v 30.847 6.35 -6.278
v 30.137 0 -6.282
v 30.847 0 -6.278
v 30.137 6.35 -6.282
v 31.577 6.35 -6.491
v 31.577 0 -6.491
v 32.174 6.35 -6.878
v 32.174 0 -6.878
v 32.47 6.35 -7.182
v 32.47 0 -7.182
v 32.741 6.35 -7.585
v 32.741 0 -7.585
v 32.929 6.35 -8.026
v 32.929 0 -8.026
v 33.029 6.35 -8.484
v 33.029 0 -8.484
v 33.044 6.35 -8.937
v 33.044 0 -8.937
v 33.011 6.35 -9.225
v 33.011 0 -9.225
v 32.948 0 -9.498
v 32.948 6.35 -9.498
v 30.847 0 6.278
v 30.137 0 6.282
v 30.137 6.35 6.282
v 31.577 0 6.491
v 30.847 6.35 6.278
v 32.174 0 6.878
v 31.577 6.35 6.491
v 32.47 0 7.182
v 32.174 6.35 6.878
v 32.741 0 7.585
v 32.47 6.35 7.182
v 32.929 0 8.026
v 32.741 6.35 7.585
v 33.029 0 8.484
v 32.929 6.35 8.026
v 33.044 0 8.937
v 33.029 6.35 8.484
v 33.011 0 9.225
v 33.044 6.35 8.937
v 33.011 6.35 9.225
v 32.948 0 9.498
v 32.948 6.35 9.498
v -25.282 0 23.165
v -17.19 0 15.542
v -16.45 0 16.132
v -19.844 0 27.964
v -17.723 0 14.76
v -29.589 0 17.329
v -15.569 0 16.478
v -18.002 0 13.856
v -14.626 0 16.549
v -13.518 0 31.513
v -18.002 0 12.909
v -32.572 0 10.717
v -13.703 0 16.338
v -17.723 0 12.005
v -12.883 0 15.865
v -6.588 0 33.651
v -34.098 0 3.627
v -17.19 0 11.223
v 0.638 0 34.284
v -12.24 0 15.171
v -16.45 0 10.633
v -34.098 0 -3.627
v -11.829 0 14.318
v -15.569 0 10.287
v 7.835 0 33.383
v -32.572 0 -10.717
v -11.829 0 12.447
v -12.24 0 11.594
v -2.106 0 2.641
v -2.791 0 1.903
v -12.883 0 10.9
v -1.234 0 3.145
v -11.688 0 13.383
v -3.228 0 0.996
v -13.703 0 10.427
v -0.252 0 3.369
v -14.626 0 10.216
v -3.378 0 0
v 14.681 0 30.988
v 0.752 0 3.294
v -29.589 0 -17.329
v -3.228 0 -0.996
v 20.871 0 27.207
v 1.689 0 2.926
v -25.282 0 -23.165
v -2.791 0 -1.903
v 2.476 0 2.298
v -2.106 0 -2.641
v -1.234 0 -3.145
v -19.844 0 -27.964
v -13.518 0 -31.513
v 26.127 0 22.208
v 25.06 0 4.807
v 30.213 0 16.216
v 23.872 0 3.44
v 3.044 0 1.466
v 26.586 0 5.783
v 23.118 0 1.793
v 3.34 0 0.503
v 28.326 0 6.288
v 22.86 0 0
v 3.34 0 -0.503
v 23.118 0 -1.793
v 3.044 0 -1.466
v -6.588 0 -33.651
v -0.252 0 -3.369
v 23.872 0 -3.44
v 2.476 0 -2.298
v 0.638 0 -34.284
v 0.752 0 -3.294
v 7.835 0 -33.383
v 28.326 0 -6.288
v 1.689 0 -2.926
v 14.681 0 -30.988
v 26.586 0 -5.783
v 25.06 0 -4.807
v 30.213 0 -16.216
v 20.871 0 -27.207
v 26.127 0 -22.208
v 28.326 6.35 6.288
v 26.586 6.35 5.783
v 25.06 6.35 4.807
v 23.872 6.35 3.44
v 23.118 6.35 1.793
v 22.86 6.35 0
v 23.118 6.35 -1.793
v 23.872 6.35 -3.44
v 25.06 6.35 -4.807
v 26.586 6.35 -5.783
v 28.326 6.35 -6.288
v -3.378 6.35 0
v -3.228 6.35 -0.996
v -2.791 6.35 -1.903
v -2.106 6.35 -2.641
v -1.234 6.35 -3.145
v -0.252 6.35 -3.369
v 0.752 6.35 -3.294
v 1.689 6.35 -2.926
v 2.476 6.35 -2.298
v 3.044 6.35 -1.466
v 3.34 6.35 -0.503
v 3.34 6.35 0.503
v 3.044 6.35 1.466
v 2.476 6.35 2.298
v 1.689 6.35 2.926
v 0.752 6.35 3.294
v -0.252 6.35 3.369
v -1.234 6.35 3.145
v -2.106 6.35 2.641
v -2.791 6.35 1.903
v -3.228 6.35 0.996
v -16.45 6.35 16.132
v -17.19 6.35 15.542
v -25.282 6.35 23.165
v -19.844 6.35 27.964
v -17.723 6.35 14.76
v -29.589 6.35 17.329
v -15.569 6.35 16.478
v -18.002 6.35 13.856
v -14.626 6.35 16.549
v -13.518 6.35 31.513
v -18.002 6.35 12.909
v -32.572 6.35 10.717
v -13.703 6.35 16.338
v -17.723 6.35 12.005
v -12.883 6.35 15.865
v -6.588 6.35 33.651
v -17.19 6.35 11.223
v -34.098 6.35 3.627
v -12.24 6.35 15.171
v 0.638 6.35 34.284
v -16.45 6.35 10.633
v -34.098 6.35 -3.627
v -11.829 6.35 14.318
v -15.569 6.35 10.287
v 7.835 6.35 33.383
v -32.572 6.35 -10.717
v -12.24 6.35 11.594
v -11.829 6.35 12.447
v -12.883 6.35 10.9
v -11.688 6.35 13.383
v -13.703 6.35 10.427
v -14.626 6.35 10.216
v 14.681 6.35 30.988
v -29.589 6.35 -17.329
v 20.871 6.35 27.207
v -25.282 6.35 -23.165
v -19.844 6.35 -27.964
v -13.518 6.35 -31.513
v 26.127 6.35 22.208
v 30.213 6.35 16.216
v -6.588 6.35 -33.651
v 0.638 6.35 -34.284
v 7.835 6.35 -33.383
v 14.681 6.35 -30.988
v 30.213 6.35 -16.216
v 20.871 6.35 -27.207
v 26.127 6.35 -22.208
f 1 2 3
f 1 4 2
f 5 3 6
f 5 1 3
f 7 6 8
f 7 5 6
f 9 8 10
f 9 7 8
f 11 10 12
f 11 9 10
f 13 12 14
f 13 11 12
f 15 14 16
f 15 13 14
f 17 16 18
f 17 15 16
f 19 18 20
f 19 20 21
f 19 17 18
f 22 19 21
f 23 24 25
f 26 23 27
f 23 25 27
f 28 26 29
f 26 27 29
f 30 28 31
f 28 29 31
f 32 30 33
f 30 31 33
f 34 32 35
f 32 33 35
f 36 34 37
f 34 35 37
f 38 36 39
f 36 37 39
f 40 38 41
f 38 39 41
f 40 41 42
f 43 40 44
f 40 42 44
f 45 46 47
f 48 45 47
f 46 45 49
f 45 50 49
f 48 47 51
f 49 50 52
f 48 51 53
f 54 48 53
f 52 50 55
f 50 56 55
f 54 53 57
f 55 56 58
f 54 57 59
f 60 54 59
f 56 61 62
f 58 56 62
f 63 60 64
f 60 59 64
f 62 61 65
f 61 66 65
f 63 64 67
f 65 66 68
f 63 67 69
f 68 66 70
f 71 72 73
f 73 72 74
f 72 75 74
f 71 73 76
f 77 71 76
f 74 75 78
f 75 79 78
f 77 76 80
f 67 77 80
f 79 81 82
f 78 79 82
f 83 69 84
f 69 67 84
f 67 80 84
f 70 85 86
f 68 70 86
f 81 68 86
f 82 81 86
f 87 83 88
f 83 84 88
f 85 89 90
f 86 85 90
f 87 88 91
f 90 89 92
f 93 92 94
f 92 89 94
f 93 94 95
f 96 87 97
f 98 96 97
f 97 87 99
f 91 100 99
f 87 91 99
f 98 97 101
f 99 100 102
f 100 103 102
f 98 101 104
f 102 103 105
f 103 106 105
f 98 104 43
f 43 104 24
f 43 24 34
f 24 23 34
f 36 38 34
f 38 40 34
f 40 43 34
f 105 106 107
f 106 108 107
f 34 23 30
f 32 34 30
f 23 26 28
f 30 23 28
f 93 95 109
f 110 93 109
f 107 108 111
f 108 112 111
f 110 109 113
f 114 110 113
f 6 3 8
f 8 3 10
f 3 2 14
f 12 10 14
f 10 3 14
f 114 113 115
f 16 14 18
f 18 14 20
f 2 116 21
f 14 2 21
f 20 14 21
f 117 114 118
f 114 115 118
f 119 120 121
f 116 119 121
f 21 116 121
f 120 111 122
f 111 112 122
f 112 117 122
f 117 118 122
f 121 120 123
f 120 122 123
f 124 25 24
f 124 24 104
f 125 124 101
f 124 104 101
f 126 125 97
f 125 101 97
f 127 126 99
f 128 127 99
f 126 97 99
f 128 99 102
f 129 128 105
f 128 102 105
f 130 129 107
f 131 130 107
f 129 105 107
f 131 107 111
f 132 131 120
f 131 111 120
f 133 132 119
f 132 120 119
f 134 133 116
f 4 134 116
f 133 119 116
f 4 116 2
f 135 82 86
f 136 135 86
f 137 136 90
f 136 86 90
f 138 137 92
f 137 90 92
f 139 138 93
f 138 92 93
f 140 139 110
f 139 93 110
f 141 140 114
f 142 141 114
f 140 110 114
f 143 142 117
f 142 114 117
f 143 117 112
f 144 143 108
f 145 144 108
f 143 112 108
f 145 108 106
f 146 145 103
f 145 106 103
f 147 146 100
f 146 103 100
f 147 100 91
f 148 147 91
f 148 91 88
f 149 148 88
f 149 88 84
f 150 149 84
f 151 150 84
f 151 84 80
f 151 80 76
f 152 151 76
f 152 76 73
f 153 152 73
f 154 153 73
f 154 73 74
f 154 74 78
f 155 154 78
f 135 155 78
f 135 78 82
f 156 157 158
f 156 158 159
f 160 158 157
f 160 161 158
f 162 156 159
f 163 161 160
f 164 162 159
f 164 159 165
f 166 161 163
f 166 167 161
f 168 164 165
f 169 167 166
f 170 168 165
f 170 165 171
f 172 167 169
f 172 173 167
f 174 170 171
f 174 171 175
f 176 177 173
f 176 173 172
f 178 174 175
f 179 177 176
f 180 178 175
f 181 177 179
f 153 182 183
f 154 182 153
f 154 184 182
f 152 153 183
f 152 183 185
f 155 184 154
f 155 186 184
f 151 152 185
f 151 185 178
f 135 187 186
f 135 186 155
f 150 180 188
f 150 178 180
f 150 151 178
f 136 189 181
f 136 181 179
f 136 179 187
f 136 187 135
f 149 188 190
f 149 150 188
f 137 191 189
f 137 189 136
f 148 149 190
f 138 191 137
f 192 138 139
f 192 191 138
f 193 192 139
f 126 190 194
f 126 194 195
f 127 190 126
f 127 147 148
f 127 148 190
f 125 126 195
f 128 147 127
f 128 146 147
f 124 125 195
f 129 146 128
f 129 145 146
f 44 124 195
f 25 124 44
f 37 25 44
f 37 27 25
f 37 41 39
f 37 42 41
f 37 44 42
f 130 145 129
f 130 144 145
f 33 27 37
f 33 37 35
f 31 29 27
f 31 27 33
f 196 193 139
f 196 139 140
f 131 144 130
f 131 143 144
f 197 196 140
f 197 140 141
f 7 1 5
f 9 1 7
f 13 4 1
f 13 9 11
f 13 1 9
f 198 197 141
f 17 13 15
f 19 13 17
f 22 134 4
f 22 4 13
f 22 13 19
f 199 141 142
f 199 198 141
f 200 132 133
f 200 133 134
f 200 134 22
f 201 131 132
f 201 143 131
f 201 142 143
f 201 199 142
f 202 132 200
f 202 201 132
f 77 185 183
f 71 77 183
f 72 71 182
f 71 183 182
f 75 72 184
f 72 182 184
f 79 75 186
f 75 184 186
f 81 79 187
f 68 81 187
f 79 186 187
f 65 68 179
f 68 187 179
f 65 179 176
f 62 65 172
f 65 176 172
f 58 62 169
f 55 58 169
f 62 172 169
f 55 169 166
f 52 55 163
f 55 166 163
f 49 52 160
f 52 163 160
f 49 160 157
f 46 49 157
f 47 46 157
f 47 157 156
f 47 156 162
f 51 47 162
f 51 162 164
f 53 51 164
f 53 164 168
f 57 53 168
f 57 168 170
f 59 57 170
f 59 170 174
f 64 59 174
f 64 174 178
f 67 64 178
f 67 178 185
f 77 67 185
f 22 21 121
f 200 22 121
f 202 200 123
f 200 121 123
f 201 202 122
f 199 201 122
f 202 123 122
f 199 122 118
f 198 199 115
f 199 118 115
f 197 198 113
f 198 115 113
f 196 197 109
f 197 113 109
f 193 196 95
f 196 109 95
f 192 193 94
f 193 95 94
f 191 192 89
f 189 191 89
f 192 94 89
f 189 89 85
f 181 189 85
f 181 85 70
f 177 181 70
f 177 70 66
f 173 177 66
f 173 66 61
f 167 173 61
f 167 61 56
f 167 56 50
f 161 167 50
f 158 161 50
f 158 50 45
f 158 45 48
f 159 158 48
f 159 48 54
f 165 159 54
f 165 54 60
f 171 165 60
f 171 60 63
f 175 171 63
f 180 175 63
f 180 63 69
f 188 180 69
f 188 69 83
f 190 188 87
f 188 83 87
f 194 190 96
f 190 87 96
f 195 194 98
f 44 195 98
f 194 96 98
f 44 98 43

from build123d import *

# Parameters (mm, degrees)
BOSS_EXTRUDE1_DEPTH     = 6.35
F_1_4_CLEARANCE_HOLE1_D = 6.7564
FILLET1_R               = 2.54
SKETCH4_R               = 3.175
CUT_EXTRUDE1_DEPTH      = 7.3500001


with BuildPart() as part:
    # Sketch1 → Boss-Extrude1 (new body)
    with BuildSketch(Plane(origin=(0, 0, 0), x_dir=(1, 0, 0), z_dir=(0, 1, 0))):
        with BuildLine():
            ThreePointArc((34.041521739, -4.120545799), (22.86, 0), (34.041521739, 4.120545799))
            ThreePointArc((34.041521739, 4.120545799), (-34.29, 0), (34.041521739, -4.120545799))
        make_face()
    extrude(amount=BOSS_EXTRUDE1_DEPTH)

    # 1/4 Clearance Hole1 (through all)
    with Locations(Plane(origin=(0, 6.35, 0), x_dir=(1, 0, 0), z_dir=(0, 1, 0))):
        with Locations((0, 0)):
            Hole(F_1_4_CLEARANCE_HOLE1_D / 2)

    # Fillet1
    fillet1_edges = [part.edges().sort_by_distance(p)[0] for p in [
        (34.041521739, 3.175, 4.120545799),
        (34.041521739, 3.175, -4.120545799),
    ]]
    fillet(fillet1_edges, radius=FILLET1_R)

    # Sketch4 → Cut-Extrude1 (cut, through all)
    with BuildSketch(Plane(origin=(0, 6.35, 0), x_dir=(1, 0, 0), z_dir=(0, 1, 0))):
        with Locations((-14.86289651, -13.382612127)):
            Circle(SKETCH4_R)
    extrude(amount=-CUT_EXTRUDE1_DEPTH, mode=Mode.SUBTRACT)


solid = part.part
